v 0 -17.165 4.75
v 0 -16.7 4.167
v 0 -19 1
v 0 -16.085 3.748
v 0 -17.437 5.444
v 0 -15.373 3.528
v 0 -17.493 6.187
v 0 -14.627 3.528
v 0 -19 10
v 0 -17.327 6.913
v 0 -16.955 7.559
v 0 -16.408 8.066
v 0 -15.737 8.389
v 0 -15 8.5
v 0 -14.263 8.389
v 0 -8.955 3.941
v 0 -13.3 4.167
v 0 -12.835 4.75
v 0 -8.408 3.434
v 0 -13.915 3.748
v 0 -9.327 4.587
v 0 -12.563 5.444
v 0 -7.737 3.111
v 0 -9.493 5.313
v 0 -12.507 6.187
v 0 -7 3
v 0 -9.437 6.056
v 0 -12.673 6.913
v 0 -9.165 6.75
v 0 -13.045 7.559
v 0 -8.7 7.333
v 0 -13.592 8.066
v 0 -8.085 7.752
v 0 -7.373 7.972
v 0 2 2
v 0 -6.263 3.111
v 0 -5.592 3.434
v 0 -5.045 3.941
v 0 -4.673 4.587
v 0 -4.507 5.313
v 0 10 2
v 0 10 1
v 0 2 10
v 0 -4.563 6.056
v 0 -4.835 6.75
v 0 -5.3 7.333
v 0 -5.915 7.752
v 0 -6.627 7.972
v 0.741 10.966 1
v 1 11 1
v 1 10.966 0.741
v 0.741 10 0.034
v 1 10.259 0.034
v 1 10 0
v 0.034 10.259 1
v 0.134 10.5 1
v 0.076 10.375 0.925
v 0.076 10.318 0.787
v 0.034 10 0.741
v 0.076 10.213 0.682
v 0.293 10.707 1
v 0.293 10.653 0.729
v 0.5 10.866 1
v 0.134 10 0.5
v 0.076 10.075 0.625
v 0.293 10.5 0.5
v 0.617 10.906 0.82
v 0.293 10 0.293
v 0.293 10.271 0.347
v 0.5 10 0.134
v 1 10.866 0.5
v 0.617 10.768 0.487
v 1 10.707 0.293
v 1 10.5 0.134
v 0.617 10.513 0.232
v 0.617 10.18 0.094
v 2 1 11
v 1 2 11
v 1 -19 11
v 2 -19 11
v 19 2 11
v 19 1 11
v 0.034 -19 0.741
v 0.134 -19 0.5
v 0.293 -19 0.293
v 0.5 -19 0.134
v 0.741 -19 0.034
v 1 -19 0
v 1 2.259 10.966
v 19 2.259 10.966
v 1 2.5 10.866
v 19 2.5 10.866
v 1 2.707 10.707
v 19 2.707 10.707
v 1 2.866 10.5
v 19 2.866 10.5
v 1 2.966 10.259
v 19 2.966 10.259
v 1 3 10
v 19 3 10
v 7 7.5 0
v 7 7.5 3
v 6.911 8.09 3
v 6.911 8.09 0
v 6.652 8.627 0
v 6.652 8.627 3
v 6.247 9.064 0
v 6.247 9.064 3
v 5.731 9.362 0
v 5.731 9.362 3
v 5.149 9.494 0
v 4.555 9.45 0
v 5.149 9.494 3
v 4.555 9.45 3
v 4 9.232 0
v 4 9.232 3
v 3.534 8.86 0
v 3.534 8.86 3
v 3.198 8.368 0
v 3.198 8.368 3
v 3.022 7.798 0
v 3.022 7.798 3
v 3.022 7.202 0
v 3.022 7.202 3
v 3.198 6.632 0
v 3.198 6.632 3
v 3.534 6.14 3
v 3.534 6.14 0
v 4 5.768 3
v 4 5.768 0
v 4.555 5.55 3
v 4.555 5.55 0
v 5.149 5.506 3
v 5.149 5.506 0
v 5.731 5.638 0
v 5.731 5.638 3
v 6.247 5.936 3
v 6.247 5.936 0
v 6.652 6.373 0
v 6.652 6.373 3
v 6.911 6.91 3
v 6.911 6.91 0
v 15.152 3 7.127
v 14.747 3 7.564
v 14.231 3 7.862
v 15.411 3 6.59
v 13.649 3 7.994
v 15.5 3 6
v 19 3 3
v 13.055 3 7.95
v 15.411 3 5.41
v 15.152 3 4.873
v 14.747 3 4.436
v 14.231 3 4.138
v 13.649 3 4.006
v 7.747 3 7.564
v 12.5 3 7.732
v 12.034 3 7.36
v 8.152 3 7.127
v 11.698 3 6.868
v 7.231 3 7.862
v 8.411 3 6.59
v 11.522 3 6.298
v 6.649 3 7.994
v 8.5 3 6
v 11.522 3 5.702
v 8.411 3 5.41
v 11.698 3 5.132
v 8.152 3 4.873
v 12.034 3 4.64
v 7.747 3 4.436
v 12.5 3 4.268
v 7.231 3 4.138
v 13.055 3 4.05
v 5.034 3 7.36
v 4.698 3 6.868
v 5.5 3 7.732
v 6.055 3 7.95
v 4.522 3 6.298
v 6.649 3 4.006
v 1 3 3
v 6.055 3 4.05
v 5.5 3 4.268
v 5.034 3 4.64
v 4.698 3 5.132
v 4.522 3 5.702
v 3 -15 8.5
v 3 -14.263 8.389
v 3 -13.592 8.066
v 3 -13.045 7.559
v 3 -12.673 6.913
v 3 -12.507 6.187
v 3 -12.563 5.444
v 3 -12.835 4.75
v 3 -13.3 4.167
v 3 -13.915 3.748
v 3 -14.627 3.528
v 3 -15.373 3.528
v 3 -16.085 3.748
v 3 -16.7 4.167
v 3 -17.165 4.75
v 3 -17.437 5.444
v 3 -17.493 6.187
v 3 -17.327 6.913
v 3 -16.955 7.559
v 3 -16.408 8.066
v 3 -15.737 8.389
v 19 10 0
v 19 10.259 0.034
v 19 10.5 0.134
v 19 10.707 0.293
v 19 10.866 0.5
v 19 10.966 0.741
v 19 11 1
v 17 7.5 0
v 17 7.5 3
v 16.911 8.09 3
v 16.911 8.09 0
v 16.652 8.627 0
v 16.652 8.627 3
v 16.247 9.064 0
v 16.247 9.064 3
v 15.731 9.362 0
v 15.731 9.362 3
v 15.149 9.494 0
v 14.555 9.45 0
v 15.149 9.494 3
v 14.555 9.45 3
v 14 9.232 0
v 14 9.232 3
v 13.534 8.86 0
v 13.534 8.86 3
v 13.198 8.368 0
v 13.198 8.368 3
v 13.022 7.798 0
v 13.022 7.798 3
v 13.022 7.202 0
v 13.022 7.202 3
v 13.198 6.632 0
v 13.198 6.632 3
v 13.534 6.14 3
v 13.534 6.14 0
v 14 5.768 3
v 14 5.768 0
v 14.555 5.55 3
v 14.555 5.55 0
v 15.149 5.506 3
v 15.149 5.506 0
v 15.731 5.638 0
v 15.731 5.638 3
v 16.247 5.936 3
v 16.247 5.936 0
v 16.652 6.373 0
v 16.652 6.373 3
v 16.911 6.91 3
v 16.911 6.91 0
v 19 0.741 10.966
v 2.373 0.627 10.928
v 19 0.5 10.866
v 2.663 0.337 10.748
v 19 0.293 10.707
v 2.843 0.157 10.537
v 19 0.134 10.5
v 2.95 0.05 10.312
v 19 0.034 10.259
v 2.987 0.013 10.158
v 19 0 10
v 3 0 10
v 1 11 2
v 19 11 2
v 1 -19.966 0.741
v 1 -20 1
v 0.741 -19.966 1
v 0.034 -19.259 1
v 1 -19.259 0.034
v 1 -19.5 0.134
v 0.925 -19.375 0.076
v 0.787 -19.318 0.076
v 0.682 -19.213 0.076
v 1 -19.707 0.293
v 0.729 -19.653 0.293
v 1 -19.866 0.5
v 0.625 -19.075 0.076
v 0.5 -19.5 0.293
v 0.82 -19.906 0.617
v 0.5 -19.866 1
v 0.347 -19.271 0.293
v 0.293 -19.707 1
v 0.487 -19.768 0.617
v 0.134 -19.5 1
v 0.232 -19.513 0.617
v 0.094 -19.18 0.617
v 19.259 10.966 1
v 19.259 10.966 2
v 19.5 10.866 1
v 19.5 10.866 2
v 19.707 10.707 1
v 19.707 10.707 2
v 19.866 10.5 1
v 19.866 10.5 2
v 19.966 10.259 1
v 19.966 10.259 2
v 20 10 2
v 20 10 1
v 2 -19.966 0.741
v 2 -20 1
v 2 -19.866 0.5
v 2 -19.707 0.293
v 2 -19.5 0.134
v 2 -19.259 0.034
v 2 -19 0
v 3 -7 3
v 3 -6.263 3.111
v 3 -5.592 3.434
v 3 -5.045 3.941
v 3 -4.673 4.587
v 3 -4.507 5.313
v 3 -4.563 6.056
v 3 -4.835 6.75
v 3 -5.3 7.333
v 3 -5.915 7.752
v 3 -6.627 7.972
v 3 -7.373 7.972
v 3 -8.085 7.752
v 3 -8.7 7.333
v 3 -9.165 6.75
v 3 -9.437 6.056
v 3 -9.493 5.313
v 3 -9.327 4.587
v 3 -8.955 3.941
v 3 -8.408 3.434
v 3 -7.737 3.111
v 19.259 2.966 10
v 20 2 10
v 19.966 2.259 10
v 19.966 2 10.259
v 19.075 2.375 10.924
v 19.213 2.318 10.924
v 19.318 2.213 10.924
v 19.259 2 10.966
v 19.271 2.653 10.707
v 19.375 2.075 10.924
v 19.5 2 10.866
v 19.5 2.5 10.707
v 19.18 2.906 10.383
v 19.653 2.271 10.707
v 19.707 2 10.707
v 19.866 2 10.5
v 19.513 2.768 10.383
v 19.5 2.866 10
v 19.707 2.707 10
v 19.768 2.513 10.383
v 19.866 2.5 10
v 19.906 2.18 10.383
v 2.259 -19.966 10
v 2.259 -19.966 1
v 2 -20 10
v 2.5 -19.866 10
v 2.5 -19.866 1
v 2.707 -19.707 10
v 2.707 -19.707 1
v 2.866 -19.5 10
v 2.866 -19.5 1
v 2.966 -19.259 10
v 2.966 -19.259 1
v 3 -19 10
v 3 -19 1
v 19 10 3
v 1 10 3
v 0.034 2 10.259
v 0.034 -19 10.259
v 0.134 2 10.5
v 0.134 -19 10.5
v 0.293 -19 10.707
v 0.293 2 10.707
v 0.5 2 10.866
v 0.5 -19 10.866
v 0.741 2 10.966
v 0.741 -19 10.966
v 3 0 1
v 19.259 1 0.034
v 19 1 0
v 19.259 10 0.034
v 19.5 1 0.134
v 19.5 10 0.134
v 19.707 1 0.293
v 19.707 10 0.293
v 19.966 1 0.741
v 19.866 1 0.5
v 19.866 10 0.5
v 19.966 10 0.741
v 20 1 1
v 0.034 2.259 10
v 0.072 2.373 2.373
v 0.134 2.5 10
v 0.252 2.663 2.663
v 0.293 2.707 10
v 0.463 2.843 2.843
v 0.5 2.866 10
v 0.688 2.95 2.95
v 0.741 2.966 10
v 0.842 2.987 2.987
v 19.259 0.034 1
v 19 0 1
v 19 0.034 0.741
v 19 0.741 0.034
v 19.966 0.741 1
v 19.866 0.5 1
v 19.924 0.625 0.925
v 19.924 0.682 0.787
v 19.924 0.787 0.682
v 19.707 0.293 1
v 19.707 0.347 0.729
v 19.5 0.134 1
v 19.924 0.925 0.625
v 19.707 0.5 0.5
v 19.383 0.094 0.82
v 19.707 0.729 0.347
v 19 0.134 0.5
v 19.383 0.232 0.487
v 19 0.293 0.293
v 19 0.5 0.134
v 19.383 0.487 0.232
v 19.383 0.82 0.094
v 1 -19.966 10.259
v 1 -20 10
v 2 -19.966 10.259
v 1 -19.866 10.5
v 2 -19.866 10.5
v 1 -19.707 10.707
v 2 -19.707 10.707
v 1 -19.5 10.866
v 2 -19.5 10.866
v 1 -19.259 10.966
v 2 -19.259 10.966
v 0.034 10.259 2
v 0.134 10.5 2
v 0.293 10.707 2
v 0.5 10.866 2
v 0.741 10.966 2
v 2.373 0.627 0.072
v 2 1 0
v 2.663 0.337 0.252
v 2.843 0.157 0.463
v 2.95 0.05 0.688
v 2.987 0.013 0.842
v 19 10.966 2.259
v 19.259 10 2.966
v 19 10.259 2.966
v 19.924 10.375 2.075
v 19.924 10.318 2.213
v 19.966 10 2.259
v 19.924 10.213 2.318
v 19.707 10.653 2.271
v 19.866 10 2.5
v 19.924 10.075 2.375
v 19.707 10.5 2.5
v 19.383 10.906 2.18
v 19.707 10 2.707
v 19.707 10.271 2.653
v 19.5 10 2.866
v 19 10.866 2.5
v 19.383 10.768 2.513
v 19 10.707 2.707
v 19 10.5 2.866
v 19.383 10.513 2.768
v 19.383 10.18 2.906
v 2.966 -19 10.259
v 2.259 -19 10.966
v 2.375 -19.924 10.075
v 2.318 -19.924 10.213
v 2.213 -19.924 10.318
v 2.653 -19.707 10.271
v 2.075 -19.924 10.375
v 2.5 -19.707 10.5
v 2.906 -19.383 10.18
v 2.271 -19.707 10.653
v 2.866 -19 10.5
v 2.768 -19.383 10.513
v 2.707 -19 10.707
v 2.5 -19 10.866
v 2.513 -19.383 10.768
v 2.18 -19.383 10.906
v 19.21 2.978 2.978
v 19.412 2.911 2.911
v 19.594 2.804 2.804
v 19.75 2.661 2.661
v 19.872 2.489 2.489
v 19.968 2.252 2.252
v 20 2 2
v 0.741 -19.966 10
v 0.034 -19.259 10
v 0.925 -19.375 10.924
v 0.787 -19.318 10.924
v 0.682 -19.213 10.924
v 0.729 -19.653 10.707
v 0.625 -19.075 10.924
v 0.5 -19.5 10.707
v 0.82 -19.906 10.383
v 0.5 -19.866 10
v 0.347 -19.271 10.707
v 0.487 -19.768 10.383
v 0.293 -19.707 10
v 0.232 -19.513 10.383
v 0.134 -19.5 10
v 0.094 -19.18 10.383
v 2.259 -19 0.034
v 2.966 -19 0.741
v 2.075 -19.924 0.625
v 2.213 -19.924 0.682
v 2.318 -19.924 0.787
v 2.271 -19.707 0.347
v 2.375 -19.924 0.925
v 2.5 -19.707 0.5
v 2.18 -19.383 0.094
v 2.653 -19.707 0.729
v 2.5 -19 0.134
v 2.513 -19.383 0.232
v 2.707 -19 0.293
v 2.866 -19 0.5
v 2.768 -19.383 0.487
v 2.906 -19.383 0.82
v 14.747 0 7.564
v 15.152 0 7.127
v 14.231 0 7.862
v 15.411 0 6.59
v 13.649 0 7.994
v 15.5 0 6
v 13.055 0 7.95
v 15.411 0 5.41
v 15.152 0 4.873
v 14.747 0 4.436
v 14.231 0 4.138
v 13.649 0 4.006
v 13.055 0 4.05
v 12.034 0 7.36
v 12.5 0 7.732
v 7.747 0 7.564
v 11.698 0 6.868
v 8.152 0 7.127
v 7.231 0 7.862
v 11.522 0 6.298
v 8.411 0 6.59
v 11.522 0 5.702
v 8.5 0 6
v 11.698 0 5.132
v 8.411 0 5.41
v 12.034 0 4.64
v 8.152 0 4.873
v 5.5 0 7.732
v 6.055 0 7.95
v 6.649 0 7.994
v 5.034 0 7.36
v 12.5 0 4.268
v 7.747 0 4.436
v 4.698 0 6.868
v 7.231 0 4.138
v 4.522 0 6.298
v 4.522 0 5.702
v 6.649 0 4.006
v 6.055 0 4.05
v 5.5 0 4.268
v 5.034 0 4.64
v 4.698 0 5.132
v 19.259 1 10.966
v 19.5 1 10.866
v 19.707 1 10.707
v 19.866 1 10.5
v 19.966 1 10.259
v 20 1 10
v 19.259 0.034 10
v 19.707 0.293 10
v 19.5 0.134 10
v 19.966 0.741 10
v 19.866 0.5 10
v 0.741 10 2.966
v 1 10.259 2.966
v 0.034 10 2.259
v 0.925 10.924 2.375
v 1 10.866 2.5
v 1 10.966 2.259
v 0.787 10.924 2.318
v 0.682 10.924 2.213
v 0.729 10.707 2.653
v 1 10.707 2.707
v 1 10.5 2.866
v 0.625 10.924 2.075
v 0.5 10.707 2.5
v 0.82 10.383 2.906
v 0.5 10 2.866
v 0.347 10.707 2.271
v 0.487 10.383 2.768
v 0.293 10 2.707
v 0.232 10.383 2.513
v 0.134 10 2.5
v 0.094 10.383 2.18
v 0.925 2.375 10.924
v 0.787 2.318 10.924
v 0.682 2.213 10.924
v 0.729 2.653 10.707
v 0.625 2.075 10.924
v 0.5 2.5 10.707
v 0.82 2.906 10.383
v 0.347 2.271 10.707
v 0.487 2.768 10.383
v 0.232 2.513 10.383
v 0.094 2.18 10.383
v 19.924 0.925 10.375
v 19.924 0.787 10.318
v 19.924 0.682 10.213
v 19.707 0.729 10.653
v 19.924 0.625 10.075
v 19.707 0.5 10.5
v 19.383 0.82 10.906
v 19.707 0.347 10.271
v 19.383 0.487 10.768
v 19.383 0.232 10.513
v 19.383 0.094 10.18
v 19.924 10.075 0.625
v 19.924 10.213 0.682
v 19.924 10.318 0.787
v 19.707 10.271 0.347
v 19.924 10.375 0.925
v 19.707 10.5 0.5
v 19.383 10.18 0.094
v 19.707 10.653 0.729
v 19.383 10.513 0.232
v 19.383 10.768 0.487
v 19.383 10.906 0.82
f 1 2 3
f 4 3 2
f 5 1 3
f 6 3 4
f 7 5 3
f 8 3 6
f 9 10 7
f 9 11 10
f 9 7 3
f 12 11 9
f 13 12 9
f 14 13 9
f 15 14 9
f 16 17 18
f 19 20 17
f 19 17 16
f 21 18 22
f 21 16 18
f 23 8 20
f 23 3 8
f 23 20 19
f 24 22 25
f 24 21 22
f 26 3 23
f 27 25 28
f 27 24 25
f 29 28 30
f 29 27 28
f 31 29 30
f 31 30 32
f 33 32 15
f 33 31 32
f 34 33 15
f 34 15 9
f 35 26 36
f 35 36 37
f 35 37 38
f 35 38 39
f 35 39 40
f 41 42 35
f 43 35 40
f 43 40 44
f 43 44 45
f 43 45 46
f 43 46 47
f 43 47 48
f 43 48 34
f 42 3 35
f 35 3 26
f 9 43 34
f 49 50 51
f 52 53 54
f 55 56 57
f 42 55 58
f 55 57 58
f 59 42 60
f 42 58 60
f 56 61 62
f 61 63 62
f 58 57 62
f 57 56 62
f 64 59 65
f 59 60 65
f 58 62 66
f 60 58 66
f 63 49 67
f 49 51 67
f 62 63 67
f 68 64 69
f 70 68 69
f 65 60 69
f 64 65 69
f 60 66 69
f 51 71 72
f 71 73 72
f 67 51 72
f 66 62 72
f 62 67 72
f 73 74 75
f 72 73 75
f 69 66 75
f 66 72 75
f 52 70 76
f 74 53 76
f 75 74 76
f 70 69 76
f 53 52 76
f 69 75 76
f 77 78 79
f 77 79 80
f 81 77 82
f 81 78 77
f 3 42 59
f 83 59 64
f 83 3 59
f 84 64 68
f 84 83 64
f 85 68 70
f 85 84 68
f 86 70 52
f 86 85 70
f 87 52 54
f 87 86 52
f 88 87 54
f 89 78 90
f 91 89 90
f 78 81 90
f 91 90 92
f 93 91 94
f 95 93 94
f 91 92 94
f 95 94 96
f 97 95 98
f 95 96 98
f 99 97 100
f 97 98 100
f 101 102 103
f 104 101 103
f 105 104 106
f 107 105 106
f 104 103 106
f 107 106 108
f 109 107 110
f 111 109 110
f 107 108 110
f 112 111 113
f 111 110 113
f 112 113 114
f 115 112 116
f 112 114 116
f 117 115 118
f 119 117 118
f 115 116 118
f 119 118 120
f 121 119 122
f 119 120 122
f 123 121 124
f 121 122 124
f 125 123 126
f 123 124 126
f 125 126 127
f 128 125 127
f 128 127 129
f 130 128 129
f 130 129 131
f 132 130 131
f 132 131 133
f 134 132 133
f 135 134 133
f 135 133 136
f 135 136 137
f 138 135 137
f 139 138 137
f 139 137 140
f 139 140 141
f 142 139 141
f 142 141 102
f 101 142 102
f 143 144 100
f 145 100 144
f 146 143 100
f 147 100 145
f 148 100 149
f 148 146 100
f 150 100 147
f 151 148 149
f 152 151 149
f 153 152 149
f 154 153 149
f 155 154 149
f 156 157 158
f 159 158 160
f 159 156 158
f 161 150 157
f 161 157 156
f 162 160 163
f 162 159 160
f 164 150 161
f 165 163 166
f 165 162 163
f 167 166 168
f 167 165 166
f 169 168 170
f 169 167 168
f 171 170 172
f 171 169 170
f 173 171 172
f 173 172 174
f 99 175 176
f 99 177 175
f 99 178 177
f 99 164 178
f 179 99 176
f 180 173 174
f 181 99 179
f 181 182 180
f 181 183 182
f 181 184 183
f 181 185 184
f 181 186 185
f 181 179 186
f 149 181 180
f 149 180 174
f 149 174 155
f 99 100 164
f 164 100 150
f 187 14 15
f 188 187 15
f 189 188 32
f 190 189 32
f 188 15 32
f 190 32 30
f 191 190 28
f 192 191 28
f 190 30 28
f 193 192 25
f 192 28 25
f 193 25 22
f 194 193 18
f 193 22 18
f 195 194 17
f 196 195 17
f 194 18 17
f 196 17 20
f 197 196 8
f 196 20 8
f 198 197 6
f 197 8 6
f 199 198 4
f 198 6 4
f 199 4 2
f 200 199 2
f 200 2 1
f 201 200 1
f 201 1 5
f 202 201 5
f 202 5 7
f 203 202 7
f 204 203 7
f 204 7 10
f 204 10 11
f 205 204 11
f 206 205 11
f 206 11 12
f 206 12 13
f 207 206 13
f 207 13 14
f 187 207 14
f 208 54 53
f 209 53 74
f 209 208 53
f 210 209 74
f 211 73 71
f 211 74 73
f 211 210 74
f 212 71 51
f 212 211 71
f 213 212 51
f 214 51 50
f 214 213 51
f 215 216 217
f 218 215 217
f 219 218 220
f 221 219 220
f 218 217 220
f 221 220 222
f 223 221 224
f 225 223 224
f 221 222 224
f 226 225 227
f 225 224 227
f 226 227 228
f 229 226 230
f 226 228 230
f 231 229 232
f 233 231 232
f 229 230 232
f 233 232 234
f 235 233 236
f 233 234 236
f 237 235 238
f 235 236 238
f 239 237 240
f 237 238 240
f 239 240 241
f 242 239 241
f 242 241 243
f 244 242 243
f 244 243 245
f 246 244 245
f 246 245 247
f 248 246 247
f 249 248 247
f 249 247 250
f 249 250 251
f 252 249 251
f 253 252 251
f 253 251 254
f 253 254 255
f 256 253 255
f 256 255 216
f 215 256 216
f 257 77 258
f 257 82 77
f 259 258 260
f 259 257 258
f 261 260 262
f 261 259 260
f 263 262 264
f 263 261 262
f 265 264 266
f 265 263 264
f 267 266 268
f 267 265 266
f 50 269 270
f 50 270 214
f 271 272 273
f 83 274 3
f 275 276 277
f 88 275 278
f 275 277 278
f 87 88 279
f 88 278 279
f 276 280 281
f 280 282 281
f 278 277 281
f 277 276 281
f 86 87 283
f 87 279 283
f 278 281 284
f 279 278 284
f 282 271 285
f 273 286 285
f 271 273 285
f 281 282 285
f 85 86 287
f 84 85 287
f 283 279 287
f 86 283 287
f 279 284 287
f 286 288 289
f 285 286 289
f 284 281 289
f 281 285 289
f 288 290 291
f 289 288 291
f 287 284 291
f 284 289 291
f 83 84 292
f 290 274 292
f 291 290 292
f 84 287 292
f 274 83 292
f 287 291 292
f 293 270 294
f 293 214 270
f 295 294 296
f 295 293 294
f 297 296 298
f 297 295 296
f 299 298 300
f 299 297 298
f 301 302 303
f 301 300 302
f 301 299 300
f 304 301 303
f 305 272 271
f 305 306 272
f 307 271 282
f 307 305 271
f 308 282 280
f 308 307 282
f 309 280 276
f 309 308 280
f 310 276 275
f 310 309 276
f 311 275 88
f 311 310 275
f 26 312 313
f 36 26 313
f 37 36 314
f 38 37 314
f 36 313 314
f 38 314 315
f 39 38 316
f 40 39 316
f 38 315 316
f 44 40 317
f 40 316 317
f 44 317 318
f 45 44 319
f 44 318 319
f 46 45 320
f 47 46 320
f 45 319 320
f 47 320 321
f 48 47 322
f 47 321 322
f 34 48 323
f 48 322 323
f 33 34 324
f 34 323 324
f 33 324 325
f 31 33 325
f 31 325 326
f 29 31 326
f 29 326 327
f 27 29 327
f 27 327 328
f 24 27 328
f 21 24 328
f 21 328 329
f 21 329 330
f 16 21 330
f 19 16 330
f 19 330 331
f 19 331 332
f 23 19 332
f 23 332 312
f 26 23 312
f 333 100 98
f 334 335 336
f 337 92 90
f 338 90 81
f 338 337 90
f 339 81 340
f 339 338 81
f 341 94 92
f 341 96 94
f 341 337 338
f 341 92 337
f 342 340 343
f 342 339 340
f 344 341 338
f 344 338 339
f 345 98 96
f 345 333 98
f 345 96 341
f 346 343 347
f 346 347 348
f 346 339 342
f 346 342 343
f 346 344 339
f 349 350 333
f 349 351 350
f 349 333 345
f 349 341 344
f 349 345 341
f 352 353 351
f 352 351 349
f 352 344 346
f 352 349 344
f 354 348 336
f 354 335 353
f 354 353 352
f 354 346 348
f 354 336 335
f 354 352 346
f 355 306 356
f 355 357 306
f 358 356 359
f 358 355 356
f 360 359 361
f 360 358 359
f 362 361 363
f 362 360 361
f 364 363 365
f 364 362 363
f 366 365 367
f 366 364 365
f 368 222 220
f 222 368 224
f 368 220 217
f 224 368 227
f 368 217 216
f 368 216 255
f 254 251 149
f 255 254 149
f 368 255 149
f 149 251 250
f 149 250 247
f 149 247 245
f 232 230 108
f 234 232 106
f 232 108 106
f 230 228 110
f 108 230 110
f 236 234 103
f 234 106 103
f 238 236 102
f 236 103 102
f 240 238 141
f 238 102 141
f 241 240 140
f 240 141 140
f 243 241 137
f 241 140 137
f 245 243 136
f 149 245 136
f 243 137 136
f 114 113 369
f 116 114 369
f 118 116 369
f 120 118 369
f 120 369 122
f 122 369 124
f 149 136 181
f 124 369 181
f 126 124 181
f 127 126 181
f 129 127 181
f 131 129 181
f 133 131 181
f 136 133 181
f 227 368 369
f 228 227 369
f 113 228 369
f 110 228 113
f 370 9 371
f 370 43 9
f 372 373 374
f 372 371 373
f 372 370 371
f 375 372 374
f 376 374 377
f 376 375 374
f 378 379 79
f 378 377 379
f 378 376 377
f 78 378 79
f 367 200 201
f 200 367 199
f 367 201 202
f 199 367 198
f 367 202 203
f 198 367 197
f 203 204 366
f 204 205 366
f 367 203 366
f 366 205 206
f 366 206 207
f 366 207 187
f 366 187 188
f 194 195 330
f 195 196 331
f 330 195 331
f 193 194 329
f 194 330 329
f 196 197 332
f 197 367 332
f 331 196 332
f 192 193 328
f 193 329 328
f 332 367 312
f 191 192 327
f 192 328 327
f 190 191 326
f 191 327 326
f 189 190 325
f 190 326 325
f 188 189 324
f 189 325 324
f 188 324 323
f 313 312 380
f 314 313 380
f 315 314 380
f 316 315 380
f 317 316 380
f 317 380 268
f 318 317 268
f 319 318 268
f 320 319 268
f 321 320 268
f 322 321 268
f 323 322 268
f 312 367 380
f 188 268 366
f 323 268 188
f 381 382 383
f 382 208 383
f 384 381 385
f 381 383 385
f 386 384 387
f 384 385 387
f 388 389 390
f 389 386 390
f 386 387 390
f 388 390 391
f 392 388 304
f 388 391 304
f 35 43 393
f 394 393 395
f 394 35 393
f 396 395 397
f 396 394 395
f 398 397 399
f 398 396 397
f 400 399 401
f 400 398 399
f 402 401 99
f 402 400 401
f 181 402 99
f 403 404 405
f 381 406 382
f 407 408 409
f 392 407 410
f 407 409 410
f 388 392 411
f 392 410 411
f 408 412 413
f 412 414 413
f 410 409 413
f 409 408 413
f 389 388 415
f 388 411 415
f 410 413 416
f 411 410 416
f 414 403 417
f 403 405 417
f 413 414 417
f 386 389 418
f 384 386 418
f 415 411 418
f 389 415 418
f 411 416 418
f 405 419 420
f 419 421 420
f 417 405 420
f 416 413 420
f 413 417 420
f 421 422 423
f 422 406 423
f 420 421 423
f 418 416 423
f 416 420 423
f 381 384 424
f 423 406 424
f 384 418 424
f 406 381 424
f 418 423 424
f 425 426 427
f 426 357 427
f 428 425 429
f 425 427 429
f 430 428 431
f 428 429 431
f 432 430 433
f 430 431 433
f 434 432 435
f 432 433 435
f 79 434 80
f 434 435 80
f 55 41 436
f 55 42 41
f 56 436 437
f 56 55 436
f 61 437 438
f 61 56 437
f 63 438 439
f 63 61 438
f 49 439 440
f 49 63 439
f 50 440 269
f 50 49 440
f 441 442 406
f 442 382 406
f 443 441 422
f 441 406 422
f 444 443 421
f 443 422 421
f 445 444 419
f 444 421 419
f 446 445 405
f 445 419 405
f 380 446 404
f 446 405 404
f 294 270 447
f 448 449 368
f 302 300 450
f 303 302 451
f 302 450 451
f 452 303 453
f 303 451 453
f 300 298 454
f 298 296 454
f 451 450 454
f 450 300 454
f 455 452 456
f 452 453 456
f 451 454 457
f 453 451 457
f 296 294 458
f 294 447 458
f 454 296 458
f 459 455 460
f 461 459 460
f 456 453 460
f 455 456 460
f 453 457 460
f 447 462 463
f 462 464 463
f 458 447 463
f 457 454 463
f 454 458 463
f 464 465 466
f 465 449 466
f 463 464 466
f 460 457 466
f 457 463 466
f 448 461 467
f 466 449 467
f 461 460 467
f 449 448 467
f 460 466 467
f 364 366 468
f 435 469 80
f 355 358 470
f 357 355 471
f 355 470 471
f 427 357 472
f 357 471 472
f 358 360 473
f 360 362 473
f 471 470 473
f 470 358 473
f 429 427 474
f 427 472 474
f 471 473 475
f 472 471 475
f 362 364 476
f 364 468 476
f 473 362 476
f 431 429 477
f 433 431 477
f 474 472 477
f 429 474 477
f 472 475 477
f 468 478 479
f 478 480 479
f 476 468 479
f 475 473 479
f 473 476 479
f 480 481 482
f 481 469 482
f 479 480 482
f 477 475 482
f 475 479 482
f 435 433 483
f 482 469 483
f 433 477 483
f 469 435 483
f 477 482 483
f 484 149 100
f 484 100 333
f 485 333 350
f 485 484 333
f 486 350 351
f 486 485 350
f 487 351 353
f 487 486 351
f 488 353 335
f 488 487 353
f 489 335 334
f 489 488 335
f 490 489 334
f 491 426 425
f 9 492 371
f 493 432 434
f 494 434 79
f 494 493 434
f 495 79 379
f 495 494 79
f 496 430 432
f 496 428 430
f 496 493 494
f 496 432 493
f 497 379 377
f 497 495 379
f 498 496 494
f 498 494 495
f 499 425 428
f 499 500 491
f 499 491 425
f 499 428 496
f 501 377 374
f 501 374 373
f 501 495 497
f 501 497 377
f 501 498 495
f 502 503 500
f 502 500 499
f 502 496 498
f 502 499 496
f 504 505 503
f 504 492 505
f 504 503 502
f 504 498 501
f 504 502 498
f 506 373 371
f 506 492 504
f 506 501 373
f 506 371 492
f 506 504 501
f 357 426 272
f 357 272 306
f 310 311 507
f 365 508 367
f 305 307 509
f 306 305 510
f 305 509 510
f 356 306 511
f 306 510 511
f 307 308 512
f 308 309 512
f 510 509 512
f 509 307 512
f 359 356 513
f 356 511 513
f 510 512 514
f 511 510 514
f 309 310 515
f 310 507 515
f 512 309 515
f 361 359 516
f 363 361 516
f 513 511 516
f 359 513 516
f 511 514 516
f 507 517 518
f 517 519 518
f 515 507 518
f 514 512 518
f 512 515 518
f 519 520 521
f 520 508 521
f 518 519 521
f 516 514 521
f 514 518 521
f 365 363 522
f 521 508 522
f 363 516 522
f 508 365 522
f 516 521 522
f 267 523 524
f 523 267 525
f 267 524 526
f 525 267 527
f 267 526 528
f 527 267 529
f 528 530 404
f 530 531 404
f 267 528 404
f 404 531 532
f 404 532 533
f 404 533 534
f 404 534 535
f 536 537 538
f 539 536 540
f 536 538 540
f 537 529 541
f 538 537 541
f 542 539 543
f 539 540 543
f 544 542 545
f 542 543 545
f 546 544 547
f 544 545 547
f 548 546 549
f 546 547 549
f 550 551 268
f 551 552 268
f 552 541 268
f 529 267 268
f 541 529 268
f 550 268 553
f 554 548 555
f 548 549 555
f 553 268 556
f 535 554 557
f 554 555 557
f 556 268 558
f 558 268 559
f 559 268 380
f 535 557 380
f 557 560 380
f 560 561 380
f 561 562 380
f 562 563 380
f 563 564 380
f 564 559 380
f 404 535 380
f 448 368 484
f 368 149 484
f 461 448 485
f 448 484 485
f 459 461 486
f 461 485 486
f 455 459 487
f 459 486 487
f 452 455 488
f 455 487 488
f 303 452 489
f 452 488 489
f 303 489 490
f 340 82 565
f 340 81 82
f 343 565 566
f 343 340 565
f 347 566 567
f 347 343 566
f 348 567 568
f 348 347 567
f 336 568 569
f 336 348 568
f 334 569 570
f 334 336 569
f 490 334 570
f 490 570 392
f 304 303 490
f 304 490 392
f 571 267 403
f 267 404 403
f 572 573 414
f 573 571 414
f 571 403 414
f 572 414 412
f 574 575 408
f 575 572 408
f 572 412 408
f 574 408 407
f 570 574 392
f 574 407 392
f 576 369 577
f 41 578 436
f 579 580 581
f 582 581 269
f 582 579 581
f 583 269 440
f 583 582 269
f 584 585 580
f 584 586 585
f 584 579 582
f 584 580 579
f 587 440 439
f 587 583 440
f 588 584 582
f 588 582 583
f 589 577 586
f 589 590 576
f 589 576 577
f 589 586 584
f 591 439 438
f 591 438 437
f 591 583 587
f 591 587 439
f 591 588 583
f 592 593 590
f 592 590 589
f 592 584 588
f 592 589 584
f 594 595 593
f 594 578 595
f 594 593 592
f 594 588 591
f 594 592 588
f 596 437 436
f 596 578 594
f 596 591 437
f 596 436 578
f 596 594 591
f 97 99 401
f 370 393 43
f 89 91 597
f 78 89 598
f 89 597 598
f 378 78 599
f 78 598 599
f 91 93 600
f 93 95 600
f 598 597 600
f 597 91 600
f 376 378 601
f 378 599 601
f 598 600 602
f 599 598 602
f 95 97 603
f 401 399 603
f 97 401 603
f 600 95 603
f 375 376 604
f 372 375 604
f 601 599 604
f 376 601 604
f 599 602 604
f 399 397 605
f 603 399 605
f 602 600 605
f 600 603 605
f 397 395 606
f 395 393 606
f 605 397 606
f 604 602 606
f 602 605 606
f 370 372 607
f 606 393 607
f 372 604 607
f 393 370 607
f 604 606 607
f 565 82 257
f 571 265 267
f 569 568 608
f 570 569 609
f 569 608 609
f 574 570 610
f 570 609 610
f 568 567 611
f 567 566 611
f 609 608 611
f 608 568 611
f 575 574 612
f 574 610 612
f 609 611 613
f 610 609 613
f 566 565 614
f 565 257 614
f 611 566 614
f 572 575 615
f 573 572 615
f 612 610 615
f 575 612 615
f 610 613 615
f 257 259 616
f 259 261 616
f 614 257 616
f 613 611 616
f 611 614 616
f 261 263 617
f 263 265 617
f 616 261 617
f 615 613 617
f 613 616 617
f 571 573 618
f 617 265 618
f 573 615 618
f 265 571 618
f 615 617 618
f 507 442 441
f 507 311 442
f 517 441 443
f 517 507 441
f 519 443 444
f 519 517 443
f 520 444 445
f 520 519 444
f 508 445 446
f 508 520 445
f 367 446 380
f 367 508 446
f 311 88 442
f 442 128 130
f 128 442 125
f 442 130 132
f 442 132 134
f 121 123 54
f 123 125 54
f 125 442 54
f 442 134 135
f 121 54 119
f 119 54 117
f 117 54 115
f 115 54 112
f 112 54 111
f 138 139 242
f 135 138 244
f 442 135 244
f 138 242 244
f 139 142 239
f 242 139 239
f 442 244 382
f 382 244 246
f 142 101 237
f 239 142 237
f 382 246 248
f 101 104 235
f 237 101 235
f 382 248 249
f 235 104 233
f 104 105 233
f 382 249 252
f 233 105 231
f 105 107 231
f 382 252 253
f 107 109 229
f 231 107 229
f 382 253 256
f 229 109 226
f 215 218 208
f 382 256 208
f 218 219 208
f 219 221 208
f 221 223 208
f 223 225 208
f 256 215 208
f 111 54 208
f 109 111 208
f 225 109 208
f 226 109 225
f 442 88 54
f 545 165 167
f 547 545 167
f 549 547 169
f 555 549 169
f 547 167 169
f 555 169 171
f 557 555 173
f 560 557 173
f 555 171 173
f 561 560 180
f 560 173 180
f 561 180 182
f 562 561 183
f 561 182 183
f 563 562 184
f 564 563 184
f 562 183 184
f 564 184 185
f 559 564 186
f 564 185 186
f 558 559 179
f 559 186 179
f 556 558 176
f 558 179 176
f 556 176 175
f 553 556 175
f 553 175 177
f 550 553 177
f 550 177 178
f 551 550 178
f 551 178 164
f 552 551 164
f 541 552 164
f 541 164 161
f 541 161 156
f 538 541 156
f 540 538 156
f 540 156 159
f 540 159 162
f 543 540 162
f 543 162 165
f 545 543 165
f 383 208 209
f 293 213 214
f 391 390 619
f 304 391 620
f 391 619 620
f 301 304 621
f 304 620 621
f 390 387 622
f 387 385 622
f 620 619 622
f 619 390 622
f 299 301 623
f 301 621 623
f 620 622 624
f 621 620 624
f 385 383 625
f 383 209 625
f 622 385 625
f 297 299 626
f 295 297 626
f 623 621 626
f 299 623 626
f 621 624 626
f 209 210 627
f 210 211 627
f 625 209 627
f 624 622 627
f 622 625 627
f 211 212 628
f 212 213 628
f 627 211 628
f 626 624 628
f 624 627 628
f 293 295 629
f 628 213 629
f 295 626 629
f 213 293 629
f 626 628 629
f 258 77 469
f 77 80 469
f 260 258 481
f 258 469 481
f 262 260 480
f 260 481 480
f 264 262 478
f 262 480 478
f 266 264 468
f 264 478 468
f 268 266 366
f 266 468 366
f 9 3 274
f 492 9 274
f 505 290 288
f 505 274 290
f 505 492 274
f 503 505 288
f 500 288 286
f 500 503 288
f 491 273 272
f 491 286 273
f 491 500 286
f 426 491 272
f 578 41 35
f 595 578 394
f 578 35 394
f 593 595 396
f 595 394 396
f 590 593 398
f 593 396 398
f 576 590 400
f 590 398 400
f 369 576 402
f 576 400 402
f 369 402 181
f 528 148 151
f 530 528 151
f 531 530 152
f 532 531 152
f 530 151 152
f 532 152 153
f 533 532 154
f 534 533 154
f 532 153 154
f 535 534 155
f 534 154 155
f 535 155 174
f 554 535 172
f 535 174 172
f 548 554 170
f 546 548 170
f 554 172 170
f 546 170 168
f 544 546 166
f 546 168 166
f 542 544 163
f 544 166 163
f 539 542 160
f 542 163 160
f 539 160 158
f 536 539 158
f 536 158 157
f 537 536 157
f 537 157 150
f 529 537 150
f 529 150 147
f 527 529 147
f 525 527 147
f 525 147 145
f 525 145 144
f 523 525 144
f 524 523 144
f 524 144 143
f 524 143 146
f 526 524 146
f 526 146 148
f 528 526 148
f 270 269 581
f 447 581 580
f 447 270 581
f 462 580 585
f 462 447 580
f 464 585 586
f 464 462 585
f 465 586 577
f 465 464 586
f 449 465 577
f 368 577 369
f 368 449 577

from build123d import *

# Parameters (mm, degrees)
SKETCH1_W           = 3
SKETCH1_H           = 8
SKETCH1_H_2         = 3
SKETCH1_W_2         = 8
BOSS_EXTRUDE1_DEPTH = 20
SKETCH2_R           = 2
CUT_EXTRUDE1_DEPTH  = 4
SKETCH3_R           = 2
CUT_EXTRUDE2_DEPTH  = 4
SKETCH4_W           = 3
SKETCH4_H           = 11
BOSS_EXTRUDE2_DEPTH = 20
SKETCH5_R           = 2.5
CUT_EXTRUDE3_DEPTH  = 21
FILLET1_R           = 1
SKETCH6_R           = 2.5
CUT_EXTRUDE4_DEPTH  = 4


with BuildPart() as part:
    # Sketch1 → Boss-Extrude1 (new body)
    with BuildSketch(Plane(origin=(0, 0, 0), x_dir=(0, 0, -1), z_dir=(1, 0, 0))):
        with Locations((-1.5, 7)):
            Rectangle(SKETCH1_W, SKETCH1_H)
        with Locations((-1.5, 1.5)):
            Rectangle(SKETCH1_W, SKETCH1_H_2)
        with Locations((-7, 1.5)):
            Rectangle(SKETCH1_W_2, SKETCH1_H_2)
    extrude(amount=BOSS_EXTRUDE1_DEPTH)

    # Sketch2 → Cut-Extrude1 (cut, through all)
    with BuildSketch(Plane.XY.offset(3)):
        with Locations((5, 7.5)):
            Circle(SKETCH2_R)
        with Locations((15, 7.5)):
            Circle(SKETCH2_R)
    extrude(amount=-CUT_EXTRUDE1_DEPTH, mode=Mode.SUBTRACT)

    # Sketch3 → Cut-Extrude2 (cut, through all)
    with BuildSketch(Plane(origin=(0, 3, 0), x_dir=(1, 0, 0), z_dir=(0, 1, 0))):
        with Locations((6.5, -6)):
            Circle(SKETCH3_R)
        with Locations((13.5, -6)):
            Circle(SKETCH3_R)
    extrude(amount=-CUT_EXTRUDE2_DEPTH, mode=Mode.SUBTRACT)

    # Sketch4 → Boss-Extrude2 (add)
    with BuildSketch(Plane.XZ):
        with Locations((1.5, 5.5)):
            Rectangle(SKETCH4_W, SKETCH4_H)
    extrude(amount=BOSS_EXTRUDE2_DEPTH)

    # Sketch5 → Cut-Extrude3 (cut, through all)
    with BuildSketch(Plane.ZY):
        with Locations((6, -15)):
            Circle(SKETCH5_R)
    extrude(amount=-CUT_EXTRUDE3_DEPTH, mode=Mode.SUBTRACT)

    # Fillet1
    fillet1_edges = [part.edges().sort_by_distance(p)[0] for p in [
        (20, 3, 7),
        (0, 3, 7),
        (0, 7, 3),
        (10, 11, 3),
        (10, 11, 0),
        (11.5, 0, 0),
        (11.5, 0, 11),
        (10, 3, 11),
        (20, 1.5, 11),
        (20, 0, 5.5),
        (20, 5.5, 0),
        (20, 11, 1.5),
        (3, -10, 0),
        (3, -10, 11),
        (0, -20, 5.5),
        (1.5, -20, 0),
        (3, -20, 5.5),
        (1.5, -20, 11),
        (20, 7, 3),
        (0, 11, 1.5),
        (0, -4.5, 0),
        (0, -8.5, 11),
    ]]
    fillet(fillet1_edges, radius=FILLET1_R)

    # Sketch6 → Cut-Extrude4 (cut, through all)
    with BuildSketch(Plane(origin=(3, 0, 0), x_dir=(0, 0, -1), z_dir=(1, 0, 0))):
        with Locations((-5.5, -7)):
            Circle(SKETCH6_R)
    extrude(amount=-CUT_EXTRUDE4_DEPTH, mode=Mode.SUBTRACT)


solid = part.part
